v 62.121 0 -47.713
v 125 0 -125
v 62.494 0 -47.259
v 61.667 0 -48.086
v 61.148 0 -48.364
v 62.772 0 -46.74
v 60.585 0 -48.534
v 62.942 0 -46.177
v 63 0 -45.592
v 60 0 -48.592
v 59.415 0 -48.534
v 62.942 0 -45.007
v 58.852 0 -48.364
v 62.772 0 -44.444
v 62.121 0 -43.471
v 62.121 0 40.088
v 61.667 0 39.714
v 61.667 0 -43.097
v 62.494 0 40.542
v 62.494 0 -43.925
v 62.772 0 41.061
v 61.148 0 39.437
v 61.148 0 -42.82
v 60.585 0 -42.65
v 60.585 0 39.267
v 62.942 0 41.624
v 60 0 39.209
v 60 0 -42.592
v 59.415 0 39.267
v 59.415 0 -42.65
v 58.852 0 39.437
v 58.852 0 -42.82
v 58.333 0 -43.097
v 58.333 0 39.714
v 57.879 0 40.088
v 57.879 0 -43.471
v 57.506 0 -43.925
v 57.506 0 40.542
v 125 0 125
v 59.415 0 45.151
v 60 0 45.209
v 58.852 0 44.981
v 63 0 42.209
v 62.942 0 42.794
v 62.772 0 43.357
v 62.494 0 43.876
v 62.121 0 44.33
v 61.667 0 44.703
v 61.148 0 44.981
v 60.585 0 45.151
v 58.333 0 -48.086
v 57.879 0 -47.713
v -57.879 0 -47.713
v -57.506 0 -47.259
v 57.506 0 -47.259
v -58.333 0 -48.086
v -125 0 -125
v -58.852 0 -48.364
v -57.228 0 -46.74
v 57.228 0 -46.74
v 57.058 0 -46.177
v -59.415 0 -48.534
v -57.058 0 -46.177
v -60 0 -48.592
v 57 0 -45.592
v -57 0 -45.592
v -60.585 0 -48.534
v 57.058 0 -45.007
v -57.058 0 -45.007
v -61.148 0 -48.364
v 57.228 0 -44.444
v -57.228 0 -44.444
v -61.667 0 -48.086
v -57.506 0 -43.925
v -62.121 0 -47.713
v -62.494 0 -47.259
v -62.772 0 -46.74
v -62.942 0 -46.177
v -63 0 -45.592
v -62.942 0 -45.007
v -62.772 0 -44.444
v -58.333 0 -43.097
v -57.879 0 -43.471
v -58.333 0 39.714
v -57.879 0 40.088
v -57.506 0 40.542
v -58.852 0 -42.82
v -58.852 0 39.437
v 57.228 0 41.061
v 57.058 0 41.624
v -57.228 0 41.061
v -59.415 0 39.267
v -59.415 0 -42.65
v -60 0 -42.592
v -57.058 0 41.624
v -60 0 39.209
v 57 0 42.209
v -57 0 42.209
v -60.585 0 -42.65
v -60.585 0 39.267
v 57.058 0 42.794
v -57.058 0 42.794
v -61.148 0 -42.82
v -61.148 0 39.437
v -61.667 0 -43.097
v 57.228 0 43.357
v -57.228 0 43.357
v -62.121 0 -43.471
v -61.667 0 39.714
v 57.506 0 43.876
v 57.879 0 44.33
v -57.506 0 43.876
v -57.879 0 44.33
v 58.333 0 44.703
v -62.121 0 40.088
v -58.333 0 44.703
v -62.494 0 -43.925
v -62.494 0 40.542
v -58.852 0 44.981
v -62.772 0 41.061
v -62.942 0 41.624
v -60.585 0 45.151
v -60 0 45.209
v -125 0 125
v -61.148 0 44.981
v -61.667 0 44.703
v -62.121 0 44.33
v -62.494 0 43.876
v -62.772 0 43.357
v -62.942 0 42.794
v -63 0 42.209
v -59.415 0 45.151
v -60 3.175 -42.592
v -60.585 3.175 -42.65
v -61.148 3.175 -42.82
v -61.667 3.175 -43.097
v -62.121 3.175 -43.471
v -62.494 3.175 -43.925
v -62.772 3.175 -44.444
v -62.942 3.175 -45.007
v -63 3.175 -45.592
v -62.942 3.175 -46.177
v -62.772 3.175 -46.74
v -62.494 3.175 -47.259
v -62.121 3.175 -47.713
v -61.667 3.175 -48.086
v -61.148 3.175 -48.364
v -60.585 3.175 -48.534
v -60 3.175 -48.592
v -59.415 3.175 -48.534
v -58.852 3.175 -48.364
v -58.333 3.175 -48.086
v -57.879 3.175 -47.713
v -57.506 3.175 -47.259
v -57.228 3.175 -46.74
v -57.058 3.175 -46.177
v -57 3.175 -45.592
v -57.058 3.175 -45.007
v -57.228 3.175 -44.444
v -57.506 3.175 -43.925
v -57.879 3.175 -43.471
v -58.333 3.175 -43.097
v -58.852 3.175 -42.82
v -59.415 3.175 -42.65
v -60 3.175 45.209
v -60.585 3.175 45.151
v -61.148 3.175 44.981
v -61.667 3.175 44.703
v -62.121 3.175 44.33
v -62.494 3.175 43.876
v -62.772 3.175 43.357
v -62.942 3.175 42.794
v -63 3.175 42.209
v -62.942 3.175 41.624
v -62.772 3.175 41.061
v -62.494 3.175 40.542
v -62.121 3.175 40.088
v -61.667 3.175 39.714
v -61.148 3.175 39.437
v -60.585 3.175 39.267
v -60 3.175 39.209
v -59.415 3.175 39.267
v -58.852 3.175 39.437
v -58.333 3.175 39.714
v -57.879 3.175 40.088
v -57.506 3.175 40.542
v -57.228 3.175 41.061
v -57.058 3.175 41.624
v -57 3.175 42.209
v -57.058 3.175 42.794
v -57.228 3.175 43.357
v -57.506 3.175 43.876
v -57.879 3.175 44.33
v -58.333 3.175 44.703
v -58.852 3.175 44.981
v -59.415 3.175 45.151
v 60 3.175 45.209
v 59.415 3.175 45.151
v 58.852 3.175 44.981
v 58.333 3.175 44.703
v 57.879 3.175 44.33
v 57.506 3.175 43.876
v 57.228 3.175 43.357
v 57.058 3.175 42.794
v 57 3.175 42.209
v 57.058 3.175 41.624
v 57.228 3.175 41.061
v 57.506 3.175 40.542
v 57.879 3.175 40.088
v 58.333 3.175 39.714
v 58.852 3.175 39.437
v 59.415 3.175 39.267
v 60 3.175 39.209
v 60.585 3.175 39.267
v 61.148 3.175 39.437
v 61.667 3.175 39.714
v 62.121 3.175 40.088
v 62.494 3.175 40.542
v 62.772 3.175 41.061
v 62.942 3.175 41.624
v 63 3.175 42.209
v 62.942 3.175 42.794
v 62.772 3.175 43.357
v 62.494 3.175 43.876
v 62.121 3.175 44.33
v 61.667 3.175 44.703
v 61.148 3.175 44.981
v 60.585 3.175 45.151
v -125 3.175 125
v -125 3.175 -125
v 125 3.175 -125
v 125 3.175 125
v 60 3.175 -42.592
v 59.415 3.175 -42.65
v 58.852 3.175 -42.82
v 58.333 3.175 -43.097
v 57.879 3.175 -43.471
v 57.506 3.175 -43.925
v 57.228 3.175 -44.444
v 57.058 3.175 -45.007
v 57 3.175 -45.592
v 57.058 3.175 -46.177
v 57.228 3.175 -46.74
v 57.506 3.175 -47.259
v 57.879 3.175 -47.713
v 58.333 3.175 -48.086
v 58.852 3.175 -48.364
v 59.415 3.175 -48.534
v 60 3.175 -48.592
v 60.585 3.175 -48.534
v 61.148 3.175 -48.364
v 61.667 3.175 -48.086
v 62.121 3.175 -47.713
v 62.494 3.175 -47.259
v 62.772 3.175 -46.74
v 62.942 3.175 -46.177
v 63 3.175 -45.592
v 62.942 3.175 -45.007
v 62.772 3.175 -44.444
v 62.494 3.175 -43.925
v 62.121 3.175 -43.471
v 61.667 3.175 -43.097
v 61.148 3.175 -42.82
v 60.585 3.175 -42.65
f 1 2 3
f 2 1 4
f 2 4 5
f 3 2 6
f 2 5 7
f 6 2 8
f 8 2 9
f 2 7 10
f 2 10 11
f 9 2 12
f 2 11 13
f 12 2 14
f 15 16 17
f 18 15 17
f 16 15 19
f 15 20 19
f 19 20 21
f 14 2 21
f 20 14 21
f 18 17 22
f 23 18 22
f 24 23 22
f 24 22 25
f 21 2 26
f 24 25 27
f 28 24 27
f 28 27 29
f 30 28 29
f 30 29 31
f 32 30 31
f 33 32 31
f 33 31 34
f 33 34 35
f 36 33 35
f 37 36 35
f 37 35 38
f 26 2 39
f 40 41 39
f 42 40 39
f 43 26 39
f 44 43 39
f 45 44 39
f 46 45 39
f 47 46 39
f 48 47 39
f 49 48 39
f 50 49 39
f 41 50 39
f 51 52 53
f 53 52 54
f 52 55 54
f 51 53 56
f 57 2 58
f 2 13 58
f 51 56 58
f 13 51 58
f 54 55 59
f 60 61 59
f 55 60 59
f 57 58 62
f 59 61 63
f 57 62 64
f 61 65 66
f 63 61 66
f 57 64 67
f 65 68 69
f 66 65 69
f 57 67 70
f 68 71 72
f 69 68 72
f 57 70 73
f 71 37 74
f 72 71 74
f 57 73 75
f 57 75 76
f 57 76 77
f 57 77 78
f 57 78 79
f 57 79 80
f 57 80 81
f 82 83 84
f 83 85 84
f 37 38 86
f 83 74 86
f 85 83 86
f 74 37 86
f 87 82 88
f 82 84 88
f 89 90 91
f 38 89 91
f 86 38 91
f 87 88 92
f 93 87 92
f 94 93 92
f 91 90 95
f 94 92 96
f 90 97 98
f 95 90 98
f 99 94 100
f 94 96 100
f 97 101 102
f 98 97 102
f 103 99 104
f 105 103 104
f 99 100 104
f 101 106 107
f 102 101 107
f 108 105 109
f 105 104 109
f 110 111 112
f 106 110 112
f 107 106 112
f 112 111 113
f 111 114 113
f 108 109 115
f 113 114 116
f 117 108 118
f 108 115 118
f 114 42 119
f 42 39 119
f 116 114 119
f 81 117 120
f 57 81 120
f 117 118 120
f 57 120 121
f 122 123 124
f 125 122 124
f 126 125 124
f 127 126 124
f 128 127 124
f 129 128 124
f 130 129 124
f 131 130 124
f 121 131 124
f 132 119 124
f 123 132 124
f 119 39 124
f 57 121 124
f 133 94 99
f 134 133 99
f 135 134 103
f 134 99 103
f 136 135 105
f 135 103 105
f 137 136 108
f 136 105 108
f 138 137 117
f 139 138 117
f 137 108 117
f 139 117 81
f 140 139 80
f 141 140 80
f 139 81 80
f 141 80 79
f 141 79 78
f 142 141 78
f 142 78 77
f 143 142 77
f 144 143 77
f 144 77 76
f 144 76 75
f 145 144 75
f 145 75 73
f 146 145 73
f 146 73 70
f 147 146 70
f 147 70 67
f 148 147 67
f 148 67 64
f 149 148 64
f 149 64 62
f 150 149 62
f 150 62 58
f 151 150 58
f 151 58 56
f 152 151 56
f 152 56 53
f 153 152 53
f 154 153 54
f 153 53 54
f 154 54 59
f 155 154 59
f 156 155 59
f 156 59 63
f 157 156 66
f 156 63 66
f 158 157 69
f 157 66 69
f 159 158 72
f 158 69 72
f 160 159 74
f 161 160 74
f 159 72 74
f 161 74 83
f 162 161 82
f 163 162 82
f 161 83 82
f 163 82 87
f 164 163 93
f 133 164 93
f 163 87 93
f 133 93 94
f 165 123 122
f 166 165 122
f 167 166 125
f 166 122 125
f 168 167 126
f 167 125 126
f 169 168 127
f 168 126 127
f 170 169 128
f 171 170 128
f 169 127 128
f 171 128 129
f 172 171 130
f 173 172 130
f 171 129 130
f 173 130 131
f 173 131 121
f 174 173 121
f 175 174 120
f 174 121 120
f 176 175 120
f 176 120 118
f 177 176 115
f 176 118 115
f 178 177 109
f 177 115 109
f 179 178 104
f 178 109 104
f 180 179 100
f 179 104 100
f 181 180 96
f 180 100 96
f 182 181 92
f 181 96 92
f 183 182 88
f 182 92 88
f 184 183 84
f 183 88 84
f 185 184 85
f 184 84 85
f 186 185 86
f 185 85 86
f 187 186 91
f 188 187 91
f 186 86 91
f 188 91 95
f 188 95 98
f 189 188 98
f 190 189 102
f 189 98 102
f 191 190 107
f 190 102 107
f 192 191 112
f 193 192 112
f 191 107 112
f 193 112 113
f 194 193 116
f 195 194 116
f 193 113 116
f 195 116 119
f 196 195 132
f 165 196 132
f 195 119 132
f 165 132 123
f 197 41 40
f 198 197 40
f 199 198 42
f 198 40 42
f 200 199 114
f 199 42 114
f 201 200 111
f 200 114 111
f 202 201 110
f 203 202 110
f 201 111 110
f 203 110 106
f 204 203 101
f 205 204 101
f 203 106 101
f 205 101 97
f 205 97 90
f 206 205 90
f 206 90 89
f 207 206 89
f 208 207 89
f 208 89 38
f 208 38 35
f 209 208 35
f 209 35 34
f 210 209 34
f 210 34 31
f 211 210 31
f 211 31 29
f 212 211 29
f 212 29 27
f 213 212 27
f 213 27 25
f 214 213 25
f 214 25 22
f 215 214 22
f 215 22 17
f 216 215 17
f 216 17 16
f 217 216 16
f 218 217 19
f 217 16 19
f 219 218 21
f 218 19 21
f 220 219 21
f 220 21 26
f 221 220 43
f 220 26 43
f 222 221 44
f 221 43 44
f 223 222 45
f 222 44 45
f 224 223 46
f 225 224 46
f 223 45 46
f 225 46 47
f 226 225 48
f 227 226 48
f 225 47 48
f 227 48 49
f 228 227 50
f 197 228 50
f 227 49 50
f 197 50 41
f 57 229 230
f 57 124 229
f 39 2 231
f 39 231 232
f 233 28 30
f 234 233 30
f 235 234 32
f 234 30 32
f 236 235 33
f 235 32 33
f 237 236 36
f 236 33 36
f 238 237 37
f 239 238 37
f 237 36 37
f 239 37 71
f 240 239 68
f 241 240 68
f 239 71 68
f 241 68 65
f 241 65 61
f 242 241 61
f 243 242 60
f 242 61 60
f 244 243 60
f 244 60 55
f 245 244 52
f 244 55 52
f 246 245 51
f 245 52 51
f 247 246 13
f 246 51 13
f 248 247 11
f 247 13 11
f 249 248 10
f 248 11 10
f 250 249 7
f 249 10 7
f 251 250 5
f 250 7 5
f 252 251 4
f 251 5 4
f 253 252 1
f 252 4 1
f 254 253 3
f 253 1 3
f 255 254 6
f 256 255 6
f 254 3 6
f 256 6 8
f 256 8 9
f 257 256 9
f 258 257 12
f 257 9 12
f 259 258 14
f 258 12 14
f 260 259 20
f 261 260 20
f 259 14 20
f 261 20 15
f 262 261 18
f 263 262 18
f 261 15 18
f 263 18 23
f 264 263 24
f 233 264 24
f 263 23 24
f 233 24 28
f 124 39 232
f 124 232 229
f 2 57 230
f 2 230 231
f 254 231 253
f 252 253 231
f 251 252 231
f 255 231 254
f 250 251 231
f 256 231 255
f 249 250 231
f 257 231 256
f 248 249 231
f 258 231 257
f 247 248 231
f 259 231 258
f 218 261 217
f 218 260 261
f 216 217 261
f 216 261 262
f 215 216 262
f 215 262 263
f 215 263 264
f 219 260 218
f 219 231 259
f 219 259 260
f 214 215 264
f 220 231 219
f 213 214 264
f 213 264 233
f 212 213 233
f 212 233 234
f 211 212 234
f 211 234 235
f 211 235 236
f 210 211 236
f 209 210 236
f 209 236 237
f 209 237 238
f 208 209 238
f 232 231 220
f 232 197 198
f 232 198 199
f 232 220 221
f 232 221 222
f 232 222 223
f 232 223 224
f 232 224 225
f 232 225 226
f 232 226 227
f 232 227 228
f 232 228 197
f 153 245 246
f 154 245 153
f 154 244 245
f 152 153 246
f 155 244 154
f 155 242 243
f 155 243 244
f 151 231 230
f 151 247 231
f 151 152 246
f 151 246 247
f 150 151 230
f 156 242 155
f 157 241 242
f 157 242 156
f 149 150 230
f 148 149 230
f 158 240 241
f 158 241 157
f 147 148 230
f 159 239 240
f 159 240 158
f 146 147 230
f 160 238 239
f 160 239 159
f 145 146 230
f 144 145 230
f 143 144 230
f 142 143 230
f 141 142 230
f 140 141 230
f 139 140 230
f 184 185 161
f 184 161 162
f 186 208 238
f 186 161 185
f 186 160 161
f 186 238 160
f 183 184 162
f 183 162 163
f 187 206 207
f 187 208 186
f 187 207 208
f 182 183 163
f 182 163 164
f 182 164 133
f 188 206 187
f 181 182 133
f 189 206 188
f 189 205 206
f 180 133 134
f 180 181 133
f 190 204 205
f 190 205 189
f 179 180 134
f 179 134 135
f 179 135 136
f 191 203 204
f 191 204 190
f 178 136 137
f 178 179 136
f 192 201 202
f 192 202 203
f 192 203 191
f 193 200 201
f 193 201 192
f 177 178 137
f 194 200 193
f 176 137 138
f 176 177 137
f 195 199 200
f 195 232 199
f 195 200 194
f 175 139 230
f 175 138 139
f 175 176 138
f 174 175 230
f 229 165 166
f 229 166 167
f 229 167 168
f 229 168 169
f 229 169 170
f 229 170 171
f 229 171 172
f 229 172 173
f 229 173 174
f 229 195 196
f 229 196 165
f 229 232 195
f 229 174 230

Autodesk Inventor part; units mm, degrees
ref_plane "YZ Plane" through (0, 0, 0) normal (1, 0, 0) x (0, 1, 0)
ref_plane "XZ Plane" through (0, 0, 0) normal (0, 1, 0) x (-1, 0, 0)
ref_plane "XY Plane" through (0, 0, 0) normal (0, 0, 1) x (1, 0, 0)
sketch "Sketch1" plane through (0, 0, 0) normal (0, 1, 0) x (-1, 0, 0)
  line L0 (-125, 125) -> (125, 125)
  line L1 (125, 125) -> (125, -125)
  line L2 (125, -125) -> (-125, -125)
  line L3 (-125, -125) -> (-125, 125)
  line L4 (175, 0) -> (-175, 0) construction
  line L5 (0, -175) -> (0, 175) construction
  point P0 (0, 0)
  dimension "d0" = 250
  dimension "d1" = 250
extrude "Extrusion1" add sketch "Sketch1" along normal blind 3.175
sketch "Sketch2" plane through (0, 3.175, 0) normal (0, 1, 0) x (1, 0, 0)
  line L0 (0, 175) -> (0, -175) construction
  line L1 (175, 0) -> (-175, 0) construction
  line L2 (125, 125) -> (-125, 125) projected
  line L3 (60, -42.2089) -> (-60, -42.2089) construction
  line L4 (60, 45.5919) -> (-60, 45.5919) construction
  point P0 (0, 0)
  dimension "d4" = 79.4081
  dimension "d5" = 87.8008
  dimension "d6" = 120
hole "Hole1" at (60, 3.175, -45.5919) at (-60, 3.175, -45.5919) at (60, 3.175, 42.2089) at (-60, 3.175, 42.2089) direction (0, -1, 0) diameter 6 end through all
properties part number "Pedalbox_V2_Floor"
